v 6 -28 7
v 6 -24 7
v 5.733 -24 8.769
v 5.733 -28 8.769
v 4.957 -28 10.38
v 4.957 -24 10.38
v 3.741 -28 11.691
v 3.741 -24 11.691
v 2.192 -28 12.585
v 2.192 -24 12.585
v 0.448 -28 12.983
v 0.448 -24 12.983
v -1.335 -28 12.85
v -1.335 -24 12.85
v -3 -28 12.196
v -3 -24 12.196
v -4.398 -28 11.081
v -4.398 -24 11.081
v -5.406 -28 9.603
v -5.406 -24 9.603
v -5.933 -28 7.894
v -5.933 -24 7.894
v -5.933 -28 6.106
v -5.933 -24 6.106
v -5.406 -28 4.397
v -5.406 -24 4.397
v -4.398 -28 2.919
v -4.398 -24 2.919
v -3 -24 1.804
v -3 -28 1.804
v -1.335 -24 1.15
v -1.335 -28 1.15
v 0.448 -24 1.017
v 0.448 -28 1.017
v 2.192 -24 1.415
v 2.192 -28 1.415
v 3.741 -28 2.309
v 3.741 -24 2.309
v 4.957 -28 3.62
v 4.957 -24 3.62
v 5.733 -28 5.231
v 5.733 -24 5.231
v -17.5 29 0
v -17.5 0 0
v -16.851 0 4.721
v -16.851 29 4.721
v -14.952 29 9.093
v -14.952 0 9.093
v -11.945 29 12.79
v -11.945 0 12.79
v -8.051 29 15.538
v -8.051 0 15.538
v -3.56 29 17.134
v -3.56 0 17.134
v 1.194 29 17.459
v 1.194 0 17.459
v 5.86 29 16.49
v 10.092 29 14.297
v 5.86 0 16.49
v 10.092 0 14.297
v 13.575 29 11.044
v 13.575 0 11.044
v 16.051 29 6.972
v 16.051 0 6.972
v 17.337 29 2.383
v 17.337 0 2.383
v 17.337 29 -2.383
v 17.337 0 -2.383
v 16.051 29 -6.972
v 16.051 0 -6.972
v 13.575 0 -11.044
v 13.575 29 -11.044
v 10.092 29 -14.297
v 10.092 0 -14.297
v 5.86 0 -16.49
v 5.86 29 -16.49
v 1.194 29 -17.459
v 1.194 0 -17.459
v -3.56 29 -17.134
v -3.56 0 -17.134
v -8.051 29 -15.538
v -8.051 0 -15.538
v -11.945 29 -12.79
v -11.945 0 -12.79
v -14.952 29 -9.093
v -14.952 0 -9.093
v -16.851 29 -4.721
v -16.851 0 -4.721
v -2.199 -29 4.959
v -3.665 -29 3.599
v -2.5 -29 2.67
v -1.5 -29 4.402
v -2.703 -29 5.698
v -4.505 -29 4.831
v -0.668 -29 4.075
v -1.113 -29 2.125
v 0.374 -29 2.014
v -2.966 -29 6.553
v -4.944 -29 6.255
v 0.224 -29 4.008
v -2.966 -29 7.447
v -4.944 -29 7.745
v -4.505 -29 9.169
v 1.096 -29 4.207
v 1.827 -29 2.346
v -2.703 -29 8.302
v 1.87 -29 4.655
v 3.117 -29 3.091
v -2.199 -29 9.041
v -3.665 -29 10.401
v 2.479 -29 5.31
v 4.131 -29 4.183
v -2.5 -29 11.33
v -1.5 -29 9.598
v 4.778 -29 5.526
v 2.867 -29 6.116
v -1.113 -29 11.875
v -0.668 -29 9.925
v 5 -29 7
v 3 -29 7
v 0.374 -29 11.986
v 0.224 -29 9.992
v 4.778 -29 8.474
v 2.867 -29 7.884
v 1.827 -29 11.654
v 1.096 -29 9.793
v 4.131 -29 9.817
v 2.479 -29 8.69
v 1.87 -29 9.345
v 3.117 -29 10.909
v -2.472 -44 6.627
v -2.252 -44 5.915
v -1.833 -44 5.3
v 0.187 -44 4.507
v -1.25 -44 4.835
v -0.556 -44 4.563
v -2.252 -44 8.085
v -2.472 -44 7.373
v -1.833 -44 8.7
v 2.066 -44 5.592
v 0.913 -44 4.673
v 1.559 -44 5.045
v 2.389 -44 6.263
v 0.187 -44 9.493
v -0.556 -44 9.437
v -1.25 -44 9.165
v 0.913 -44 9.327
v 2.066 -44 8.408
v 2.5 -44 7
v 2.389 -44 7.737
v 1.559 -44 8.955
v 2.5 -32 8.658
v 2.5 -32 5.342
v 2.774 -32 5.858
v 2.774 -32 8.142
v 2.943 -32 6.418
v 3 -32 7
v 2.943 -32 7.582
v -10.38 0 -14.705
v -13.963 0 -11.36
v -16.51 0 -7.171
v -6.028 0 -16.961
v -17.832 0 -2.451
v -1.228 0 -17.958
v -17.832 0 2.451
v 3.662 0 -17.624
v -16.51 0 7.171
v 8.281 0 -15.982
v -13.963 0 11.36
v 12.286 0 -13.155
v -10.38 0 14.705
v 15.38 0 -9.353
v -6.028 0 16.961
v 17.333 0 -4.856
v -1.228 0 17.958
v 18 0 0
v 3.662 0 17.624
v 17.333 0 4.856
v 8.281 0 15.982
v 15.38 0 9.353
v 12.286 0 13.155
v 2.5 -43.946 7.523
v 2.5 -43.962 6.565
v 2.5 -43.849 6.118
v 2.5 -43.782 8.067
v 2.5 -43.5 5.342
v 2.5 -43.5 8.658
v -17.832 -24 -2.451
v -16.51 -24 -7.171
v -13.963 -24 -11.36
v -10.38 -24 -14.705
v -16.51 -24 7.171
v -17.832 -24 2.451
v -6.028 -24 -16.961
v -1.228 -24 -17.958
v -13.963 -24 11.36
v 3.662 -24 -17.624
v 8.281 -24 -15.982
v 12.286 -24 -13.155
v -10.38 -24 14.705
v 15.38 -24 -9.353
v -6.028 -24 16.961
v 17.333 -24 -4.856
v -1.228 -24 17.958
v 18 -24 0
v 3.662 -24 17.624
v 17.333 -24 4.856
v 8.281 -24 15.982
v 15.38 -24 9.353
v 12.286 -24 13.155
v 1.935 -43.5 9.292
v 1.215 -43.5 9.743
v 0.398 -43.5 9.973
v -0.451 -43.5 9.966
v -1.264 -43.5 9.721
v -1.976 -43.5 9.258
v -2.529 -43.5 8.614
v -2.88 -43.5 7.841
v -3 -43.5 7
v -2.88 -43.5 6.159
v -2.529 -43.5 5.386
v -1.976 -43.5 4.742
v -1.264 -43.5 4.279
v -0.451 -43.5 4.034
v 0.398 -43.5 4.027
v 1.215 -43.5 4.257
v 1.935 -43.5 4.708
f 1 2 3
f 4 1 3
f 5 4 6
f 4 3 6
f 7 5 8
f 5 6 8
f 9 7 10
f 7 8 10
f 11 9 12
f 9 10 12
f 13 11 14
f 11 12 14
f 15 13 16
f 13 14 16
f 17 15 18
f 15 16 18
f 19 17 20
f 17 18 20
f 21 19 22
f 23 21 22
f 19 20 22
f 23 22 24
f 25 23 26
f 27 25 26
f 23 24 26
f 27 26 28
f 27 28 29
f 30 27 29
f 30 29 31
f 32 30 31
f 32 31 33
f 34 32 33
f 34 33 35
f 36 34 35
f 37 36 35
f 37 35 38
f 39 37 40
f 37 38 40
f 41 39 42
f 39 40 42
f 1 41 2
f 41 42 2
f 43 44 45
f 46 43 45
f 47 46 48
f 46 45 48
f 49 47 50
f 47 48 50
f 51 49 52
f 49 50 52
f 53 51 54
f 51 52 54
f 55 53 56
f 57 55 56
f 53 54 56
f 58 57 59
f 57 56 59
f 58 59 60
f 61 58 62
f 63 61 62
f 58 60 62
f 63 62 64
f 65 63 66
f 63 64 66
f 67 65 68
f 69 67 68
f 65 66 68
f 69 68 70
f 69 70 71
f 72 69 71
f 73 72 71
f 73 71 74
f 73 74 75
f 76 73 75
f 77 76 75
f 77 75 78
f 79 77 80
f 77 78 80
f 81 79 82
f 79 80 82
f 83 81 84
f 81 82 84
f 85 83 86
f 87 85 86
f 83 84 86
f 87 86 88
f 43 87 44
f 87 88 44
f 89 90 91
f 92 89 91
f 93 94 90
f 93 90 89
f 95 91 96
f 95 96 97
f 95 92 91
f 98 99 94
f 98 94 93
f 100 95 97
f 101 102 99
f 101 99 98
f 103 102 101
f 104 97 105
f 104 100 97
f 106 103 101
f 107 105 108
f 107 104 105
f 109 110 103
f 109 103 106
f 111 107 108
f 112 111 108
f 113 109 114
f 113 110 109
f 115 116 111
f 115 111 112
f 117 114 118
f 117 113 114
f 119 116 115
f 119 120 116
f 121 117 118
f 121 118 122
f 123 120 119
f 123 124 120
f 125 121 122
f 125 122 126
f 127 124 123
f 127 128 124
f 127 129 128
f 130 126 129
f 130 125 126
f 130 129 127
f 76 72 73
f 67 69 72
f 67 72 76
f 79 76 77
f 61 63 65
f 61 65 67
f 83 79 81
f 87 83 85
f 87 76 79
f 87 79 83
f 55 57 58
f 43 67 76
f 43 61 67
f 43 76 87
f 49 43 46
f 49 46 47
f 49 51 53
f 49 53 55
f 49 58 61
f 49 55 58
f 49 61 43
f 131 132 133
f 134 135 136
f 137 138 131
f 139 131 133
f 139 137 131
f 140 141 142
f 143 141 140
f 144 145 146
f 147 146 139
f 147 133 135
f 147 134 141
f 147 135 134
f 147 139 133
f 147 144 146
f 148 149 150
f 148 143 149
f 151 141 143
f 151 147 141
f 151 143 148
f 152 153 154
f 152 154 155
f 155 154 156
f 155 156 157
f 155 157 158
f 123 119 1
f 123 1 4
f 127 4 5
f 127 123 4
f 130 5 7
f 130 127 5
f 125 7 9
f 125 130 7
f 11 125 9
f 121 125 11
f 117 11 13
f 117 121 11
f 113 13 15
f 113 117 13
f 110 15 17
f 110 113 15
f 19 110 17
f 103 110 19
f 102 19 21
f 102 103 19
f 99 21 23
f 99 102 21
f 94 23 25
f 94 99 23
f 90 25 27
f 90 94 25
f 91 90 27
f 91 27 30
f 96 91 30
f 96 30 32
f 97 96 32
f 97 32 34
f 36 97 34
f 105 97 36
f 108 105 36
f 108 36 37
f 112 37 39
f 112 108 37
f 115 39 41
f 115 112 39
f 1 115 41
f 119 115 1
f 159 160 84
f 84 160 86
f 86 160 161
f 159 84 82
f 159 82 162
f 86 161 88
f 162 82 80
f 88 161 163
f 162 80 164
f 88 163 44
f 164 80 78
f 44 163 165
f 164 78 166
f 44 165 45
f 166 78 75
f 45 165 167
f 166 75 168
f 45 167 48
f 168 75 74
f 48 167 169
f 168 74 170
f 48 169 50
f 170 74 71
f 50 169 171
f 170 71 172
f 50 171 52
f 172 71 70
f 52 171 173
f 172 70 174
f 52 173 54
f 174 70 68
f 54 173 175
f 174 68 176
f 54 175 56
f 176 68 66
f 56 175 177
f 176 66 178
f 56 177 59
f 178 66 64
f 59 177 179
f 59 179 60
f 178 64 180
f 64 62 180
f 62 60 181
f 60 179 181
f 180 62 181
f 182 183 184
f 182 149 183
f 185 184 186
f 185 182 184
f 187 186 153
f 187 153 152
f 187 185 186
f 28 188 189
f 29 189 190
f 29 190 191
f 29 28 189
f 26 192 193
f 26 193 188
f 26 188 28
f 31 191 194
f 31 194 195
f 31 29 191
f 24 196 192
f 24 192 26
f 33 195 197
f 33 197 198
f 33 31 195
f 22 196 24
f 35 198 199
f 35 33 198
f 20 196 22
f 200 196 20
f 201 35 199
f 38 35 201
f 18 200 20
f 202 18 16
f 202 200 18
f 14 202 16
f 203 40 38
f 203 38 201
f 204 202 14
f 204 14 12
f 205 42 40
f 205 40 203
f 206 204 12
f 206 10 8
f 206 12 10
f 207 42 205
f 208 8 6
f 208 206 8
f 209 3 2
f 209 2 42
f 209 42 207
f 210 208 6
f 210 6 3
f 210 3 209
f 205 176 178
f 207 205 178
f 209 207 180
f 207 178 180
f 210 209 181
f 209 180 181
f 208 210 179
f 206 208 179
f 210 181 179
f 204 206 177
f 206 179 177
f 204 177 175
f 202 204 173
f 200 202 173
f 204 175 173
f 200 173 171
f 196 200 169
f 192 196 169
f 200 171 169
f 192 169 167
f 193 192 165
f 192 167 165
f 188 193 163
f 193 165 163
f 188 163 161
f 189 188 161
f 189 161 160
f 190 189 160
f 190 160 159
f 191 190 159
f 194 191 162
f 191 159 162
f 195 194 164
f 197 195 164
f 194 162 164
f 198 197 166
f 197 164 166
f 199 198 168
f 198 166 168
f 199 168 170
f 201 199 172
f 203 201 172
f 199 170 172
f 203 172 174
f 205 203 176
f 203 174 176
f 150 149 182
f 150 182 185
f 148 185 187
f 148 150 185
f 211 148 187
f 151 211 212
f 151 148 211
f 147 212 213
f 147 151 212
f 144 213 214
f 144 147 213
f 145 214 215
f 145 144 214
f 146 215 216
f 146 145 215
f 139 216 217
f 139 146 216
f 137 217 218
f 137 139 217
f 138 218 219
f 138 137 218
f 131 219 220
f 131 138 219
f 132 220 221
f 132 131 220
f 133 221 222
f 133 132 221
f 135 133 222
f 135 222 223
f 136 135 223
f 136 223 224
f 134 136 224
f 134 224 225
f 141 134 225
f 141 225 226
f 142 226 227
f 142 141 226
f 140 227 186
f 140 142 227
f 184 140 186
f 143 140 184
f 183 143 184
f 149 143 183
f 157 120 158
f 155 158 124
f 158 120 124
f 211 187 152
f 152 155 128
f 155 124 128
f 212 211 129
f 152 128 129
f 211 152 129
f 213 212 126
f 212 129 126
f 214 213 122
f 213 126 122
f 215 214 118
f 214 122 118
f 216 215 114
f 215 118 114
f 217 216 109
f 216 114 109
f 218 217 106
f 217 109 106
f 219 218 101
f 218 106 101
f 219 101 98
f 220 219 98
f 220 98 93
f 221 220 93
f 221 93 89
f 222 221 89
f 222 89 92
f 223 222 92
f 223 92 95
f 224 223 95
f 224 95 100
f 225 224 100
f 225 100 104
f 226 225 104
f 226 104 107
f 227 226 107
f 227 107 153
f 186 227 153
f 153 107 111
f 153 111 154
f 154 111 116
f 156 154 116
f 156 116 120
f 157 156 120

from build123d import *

# Parameters (mm, degrees)
F0_R      = 18
F1_DEPTH  = 24
F2_R      = 6
F3_DEPTH  = 5
F4_SIZE   = 1
F5_R      = 3
F6_DEPTH  = 15
F7_SIZE   = 0.5
F8_W      = 1.9986620047
F8_H      = 4.7967880898
F9_DEPTH  = 12
F10_R     = 17.5
F11_DEPTH = 29


with BuildPart() as f1:
    # F0 (on Front) → F1 (new body)
    with BuildSketch(Plane.XZ):
        Circle(F0_R)
    extrude(amount=F1_DEPTH)

    # F2 (on face) → F3 (join)
    with BuildSketch(Plane.XZ.offset(24)):
        with Locations((0, 7)):
            Circle(F2_R)
    extrude(amount=F3_DEPTH)

    # F4
    f4_edges = [f1.edges().sort_by_distance(p)[0] for p in [
        (-6, -29, 7),
    ]]
    chamfer(f4_edges, length=F4_SIZE)

    # F5 (on face) → F6 (join)
    with BuildSketch(Plane.XZ.offset(29)):
        with Locations((0, 7)):
            Circle(F5_R)
    extrude(amount=F6_DEPTH)

    # F7
    f7_edges = [f1.edges().sort_by_distance(p)[0] for p in [
        (-3, -44, 7),
    ]]
    chamfer(f7_edges, length=F7_SIZE)

    # F8 (on face) → F9 (cut)
    with BuildSketch(Plane.XZ.offset(44)):
        with Locations((3.4993309465, 6.97000045)):
            Rectangle(F8_W, F8_H)
    extrude(amount=-F9_DEPTH, mode=Mode.SUBTRACT)

    # F10 (on face) → F11 (join)
    with BuildSketch(Plane(origin=(0, 0, 0), x_dir=(-1, 0, 0), z_dir=(0, 1, 0))):
        Circle(F10_R)
    extrude(amount=F11_DEPTH)


solid = f1.part
